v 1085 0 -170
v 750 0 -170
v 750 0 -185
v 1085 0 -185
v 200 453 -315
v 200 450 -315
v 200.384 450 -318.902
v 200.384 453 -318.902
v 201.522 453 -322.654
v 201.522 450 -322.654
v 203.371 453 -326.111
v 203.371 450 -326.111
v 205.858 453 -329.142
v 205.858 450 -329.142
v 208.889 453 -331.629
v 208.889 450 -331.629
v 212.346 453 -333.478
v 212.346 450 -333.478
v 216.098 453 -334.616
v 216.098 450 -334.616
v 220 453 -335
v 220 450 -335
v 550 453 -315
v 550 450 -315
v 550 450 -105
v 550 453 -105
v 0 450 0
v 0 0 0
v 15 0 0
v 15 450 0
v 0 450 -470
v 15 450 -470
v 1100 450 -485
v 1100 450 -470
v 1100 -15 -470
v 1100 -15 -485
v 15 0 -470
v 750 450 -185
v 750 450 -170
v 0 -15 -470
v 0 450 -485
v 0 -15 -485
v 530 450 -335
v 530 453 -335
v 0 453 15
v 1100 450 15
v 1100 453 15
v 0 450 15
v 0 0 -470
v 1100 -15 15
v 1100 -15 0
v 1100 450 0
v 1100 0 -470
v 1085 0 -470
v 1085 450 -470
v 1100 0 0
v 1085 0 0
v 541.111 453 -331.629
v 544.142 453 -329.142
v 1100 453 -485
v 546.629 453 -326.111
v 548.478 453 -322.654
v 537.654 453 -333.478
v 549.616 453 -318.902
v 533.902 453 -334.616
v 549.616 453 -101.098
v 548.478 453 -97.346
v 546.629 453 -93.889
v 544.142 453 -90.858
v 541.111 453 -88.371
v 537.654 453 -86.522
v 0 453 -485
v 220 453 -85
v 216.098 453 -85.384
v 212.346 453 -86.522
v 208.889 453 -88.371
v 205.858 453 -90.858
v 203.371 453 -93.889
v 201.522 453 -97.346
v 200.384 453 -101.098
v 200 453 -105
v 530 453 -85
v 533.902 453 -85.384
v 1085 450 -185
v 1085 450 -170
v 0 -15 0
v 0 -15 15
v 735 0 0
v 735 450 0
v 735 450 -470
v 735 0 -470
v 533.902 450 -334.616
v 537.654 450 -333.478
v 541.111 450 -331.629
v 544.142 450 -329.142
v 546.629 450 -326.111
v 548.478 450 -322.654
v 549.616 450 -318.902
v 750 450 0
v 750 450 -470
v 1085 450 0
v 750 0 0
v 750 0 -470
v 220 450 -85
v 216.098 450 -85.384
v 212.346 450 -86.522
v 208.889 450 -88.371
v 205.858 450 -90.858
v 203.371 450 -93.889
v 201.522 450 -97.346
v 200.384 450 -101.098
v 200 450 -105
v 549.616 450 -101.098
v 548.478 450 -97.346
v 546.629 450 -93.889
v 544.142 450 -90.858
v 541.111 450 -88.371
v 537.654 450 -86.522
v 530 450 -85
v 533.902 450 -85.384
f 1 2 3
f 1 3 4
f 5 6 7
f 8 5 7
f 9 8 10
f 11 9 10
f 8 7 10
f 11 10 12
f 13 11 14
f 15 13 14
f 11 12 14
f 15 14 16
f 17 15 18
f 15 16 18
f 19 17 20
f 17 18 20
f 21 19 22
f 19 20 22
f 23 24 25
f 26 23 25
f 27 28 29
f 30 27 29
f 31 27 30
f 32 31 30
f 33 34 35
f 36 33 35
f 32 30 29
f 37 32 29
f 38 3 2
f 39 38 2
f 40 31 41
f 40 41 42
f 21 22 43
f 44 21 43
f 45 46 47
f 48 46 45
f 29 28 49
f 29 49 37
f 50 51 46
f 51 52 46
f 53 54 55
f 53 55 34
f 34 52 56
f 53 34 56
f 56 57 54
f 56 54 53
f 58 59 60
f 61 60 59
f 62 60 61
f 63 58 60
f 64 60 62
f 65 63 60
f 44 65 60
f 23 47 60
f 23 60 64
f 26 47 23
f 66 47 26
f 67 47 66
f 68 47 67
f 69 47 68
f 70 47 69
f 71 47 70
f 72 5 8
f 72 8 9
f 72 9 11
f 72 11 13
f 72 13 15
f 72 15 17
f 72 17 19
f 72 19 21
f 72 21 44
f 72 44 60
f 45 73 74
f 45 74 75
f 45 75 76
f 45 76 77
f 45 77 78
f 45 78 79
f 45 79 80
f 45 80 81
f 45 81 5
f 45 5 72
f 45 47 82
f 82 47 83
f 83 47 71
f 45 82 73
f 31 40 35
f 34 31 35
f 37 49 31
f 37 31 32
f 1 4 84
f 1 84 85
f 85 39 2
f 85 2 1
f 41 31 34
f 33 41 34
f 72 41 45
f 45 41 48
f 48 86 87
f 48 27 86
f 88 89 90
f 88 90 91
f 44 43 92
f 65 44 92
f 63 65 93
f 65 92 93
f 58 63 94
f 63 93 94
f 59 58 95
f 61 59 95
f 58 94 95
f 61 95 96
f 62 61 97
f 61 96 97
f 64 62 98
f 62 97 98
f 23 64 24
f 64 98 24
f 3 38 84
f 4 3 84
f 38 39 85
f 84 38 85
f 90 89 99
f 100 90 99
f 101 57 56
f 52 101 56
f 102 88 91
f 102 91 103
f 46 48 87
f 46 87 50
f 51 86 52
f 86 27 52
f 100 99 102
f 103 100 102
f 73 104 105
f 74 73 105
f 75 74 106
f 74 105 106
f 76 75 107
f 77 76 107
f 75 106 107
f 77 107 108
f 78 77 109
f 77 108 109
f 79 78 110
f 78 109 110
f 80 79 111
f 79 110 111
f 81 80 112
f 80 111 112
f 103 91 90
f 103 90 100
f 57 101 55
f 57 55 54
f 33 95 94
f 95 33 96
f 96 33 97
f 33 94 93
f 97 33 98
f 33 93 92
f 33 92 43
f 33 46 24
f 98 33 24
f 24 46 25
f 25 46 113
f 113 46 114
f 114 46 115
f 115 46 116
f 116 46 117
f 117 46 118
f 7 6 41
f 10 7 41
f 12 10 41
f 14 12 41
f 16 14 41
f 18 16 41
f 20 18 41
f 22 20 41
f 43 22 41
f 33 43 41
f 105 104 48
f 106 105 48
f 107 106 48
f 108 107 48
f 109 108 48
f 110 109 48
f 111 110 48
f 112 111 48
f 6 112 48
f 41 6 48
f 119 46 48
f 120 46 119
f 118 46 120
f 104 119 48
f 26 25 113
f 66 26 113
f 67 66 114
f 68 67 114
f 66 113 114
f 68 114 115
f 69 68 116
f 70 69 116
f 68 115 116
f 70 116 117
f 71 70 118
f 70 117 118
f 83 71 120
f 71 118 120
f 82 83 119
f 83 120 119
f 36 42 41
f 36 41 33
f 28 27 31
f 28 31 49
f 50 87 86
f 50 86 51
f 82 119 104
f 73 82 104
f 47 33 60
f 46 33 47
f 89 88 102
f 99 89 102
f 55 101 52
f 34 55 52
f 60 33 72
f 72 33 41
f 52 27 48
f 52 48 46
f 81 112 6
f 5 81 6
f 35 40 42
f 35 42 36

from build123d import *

# Parameters (mm, degrees)
F0_W      = 1100
F0_H      = 450
F1_DEPTH  = 15
F2_W      = 15
F2_H      = 450
F3_DEPTH  = 470
F4_W      = 1100
F4_H      = 15
F5_DEPTH  = 15
F6_W      = 1100
F6_H      = 465
F7_DEPTH  = 15
F8_W      = 335
F8_H      = 15
F9_DEPTH  = 450
F10_W     = 1100
F10_H     = 500
F11_DEPTH = 3


with BuildPart() as f1:
    # F0 (on Top) → F1 (new body)
    with BuildSketch(Plane.XY):
        with Locations((550, 225)):
            Rectangle(F0_W, F0_H)
    extrude(amount=F1_DEPTH)

    # F4 (on face) → F5 (join)
    with BuildSketch(Plane.XZ):
        with Locations((550, 7.5)):
            Rectangle(F4_W, F4_H)
    extrude(amount=F5_DEPTH)


with BuildPart() as f3:
    # F2 (on face) → F3 (new body)
    with BuildSketch(Plane(origin=(0, 0, 0), x_dir=(1, 0, 0), z_dir=(0, 0, -1))):
        with Locations((1092.5, -225)):
            Rectangle(F2_W, F2_H)
    extrude(amount=F3_DEPTH)


with BuildPart() as f3b:
    # F2 (on face) → F3, piece 2 (new body)
    with BuildSketch(Plane(origin=(0, 0, 0), x_dir=(1, 0, 0), z_dir=(0, 0, -1))):
        with Locations((7.5, -225)):
            Rectangle(F2_W, F2_H)
    extrude(amount=F3_DEPTH)


with BuildPart() as f3c:
    # F2 (on face) → F3, piece 3 (new body)
    with BuildSketch(Plane(origin=(0, 0, 0), x_dir=(1, 0, 0), z_dir=(0, 0, -1))):
        with Locations((742.5, -225)):
            Rectangle(F2_W, F2_H)
    extrude(amount=F3_DEPTH)


with BuildPart() as f7:
    # F6 (on face) → F7 (new body)
    with BuildSketch(Plane(origin=(0, 0, -470), x_dir=(1, 0, 0), z_dir=(0, 0, -1))):
        with Locations((550, -217.5)):
            Rectangle(F6_W, F6_H)
    extrude(amount=F7_DEPTH)


with BuildPart() as f9:
    # F8 (on face) → F9 (new body, through all)
    with BuildSketch(Plane.XZ):
        with Locations((917.5, -177.5)):
            Rectangle(F8_W, F8_H)
    extrude(amount=-F9_DEPTH)


with BuildPart() as f11:
    # F10 (on face) → F11 (new body)
    with BuildSketch(Plane(origin=(0, 450, 0), x_dir=(-1, 0, 0), z_dir=(0, 1, 0))):
        with Locations((-550, -235)):
            Rectangle(F10_W, F10_H)
        with BuildLine():
            ThreePointArc((-550, -105), (-544.1421356237, -90.8578643763), (-530, -85))
            Line((-530, -85), (-220, -85))
            ThreePointArc((-220, -85), (-205.8578643763, -90.8578643763), (-200, -105))
            Line((-200, -105), (-200, -315))
            ThreePointArc((-200, -315), (-205.8578643763, -329.1421356237), (-220, -335))
            Line((-220, -335), (-530, -335))
            ThreePointArc((-530, -335), (-544.1421356237, -329.1421356237), (-550, -315))
            Line((-550, -315), (-550, -105))
        make_face(mode=Mode.SUBTRACT)
    extrude(amount=F11_DEPTH)


solid = Compound([f1.part, f3.part, f3b.part, f3c.part, f7.part, f9.part, f11.part])
